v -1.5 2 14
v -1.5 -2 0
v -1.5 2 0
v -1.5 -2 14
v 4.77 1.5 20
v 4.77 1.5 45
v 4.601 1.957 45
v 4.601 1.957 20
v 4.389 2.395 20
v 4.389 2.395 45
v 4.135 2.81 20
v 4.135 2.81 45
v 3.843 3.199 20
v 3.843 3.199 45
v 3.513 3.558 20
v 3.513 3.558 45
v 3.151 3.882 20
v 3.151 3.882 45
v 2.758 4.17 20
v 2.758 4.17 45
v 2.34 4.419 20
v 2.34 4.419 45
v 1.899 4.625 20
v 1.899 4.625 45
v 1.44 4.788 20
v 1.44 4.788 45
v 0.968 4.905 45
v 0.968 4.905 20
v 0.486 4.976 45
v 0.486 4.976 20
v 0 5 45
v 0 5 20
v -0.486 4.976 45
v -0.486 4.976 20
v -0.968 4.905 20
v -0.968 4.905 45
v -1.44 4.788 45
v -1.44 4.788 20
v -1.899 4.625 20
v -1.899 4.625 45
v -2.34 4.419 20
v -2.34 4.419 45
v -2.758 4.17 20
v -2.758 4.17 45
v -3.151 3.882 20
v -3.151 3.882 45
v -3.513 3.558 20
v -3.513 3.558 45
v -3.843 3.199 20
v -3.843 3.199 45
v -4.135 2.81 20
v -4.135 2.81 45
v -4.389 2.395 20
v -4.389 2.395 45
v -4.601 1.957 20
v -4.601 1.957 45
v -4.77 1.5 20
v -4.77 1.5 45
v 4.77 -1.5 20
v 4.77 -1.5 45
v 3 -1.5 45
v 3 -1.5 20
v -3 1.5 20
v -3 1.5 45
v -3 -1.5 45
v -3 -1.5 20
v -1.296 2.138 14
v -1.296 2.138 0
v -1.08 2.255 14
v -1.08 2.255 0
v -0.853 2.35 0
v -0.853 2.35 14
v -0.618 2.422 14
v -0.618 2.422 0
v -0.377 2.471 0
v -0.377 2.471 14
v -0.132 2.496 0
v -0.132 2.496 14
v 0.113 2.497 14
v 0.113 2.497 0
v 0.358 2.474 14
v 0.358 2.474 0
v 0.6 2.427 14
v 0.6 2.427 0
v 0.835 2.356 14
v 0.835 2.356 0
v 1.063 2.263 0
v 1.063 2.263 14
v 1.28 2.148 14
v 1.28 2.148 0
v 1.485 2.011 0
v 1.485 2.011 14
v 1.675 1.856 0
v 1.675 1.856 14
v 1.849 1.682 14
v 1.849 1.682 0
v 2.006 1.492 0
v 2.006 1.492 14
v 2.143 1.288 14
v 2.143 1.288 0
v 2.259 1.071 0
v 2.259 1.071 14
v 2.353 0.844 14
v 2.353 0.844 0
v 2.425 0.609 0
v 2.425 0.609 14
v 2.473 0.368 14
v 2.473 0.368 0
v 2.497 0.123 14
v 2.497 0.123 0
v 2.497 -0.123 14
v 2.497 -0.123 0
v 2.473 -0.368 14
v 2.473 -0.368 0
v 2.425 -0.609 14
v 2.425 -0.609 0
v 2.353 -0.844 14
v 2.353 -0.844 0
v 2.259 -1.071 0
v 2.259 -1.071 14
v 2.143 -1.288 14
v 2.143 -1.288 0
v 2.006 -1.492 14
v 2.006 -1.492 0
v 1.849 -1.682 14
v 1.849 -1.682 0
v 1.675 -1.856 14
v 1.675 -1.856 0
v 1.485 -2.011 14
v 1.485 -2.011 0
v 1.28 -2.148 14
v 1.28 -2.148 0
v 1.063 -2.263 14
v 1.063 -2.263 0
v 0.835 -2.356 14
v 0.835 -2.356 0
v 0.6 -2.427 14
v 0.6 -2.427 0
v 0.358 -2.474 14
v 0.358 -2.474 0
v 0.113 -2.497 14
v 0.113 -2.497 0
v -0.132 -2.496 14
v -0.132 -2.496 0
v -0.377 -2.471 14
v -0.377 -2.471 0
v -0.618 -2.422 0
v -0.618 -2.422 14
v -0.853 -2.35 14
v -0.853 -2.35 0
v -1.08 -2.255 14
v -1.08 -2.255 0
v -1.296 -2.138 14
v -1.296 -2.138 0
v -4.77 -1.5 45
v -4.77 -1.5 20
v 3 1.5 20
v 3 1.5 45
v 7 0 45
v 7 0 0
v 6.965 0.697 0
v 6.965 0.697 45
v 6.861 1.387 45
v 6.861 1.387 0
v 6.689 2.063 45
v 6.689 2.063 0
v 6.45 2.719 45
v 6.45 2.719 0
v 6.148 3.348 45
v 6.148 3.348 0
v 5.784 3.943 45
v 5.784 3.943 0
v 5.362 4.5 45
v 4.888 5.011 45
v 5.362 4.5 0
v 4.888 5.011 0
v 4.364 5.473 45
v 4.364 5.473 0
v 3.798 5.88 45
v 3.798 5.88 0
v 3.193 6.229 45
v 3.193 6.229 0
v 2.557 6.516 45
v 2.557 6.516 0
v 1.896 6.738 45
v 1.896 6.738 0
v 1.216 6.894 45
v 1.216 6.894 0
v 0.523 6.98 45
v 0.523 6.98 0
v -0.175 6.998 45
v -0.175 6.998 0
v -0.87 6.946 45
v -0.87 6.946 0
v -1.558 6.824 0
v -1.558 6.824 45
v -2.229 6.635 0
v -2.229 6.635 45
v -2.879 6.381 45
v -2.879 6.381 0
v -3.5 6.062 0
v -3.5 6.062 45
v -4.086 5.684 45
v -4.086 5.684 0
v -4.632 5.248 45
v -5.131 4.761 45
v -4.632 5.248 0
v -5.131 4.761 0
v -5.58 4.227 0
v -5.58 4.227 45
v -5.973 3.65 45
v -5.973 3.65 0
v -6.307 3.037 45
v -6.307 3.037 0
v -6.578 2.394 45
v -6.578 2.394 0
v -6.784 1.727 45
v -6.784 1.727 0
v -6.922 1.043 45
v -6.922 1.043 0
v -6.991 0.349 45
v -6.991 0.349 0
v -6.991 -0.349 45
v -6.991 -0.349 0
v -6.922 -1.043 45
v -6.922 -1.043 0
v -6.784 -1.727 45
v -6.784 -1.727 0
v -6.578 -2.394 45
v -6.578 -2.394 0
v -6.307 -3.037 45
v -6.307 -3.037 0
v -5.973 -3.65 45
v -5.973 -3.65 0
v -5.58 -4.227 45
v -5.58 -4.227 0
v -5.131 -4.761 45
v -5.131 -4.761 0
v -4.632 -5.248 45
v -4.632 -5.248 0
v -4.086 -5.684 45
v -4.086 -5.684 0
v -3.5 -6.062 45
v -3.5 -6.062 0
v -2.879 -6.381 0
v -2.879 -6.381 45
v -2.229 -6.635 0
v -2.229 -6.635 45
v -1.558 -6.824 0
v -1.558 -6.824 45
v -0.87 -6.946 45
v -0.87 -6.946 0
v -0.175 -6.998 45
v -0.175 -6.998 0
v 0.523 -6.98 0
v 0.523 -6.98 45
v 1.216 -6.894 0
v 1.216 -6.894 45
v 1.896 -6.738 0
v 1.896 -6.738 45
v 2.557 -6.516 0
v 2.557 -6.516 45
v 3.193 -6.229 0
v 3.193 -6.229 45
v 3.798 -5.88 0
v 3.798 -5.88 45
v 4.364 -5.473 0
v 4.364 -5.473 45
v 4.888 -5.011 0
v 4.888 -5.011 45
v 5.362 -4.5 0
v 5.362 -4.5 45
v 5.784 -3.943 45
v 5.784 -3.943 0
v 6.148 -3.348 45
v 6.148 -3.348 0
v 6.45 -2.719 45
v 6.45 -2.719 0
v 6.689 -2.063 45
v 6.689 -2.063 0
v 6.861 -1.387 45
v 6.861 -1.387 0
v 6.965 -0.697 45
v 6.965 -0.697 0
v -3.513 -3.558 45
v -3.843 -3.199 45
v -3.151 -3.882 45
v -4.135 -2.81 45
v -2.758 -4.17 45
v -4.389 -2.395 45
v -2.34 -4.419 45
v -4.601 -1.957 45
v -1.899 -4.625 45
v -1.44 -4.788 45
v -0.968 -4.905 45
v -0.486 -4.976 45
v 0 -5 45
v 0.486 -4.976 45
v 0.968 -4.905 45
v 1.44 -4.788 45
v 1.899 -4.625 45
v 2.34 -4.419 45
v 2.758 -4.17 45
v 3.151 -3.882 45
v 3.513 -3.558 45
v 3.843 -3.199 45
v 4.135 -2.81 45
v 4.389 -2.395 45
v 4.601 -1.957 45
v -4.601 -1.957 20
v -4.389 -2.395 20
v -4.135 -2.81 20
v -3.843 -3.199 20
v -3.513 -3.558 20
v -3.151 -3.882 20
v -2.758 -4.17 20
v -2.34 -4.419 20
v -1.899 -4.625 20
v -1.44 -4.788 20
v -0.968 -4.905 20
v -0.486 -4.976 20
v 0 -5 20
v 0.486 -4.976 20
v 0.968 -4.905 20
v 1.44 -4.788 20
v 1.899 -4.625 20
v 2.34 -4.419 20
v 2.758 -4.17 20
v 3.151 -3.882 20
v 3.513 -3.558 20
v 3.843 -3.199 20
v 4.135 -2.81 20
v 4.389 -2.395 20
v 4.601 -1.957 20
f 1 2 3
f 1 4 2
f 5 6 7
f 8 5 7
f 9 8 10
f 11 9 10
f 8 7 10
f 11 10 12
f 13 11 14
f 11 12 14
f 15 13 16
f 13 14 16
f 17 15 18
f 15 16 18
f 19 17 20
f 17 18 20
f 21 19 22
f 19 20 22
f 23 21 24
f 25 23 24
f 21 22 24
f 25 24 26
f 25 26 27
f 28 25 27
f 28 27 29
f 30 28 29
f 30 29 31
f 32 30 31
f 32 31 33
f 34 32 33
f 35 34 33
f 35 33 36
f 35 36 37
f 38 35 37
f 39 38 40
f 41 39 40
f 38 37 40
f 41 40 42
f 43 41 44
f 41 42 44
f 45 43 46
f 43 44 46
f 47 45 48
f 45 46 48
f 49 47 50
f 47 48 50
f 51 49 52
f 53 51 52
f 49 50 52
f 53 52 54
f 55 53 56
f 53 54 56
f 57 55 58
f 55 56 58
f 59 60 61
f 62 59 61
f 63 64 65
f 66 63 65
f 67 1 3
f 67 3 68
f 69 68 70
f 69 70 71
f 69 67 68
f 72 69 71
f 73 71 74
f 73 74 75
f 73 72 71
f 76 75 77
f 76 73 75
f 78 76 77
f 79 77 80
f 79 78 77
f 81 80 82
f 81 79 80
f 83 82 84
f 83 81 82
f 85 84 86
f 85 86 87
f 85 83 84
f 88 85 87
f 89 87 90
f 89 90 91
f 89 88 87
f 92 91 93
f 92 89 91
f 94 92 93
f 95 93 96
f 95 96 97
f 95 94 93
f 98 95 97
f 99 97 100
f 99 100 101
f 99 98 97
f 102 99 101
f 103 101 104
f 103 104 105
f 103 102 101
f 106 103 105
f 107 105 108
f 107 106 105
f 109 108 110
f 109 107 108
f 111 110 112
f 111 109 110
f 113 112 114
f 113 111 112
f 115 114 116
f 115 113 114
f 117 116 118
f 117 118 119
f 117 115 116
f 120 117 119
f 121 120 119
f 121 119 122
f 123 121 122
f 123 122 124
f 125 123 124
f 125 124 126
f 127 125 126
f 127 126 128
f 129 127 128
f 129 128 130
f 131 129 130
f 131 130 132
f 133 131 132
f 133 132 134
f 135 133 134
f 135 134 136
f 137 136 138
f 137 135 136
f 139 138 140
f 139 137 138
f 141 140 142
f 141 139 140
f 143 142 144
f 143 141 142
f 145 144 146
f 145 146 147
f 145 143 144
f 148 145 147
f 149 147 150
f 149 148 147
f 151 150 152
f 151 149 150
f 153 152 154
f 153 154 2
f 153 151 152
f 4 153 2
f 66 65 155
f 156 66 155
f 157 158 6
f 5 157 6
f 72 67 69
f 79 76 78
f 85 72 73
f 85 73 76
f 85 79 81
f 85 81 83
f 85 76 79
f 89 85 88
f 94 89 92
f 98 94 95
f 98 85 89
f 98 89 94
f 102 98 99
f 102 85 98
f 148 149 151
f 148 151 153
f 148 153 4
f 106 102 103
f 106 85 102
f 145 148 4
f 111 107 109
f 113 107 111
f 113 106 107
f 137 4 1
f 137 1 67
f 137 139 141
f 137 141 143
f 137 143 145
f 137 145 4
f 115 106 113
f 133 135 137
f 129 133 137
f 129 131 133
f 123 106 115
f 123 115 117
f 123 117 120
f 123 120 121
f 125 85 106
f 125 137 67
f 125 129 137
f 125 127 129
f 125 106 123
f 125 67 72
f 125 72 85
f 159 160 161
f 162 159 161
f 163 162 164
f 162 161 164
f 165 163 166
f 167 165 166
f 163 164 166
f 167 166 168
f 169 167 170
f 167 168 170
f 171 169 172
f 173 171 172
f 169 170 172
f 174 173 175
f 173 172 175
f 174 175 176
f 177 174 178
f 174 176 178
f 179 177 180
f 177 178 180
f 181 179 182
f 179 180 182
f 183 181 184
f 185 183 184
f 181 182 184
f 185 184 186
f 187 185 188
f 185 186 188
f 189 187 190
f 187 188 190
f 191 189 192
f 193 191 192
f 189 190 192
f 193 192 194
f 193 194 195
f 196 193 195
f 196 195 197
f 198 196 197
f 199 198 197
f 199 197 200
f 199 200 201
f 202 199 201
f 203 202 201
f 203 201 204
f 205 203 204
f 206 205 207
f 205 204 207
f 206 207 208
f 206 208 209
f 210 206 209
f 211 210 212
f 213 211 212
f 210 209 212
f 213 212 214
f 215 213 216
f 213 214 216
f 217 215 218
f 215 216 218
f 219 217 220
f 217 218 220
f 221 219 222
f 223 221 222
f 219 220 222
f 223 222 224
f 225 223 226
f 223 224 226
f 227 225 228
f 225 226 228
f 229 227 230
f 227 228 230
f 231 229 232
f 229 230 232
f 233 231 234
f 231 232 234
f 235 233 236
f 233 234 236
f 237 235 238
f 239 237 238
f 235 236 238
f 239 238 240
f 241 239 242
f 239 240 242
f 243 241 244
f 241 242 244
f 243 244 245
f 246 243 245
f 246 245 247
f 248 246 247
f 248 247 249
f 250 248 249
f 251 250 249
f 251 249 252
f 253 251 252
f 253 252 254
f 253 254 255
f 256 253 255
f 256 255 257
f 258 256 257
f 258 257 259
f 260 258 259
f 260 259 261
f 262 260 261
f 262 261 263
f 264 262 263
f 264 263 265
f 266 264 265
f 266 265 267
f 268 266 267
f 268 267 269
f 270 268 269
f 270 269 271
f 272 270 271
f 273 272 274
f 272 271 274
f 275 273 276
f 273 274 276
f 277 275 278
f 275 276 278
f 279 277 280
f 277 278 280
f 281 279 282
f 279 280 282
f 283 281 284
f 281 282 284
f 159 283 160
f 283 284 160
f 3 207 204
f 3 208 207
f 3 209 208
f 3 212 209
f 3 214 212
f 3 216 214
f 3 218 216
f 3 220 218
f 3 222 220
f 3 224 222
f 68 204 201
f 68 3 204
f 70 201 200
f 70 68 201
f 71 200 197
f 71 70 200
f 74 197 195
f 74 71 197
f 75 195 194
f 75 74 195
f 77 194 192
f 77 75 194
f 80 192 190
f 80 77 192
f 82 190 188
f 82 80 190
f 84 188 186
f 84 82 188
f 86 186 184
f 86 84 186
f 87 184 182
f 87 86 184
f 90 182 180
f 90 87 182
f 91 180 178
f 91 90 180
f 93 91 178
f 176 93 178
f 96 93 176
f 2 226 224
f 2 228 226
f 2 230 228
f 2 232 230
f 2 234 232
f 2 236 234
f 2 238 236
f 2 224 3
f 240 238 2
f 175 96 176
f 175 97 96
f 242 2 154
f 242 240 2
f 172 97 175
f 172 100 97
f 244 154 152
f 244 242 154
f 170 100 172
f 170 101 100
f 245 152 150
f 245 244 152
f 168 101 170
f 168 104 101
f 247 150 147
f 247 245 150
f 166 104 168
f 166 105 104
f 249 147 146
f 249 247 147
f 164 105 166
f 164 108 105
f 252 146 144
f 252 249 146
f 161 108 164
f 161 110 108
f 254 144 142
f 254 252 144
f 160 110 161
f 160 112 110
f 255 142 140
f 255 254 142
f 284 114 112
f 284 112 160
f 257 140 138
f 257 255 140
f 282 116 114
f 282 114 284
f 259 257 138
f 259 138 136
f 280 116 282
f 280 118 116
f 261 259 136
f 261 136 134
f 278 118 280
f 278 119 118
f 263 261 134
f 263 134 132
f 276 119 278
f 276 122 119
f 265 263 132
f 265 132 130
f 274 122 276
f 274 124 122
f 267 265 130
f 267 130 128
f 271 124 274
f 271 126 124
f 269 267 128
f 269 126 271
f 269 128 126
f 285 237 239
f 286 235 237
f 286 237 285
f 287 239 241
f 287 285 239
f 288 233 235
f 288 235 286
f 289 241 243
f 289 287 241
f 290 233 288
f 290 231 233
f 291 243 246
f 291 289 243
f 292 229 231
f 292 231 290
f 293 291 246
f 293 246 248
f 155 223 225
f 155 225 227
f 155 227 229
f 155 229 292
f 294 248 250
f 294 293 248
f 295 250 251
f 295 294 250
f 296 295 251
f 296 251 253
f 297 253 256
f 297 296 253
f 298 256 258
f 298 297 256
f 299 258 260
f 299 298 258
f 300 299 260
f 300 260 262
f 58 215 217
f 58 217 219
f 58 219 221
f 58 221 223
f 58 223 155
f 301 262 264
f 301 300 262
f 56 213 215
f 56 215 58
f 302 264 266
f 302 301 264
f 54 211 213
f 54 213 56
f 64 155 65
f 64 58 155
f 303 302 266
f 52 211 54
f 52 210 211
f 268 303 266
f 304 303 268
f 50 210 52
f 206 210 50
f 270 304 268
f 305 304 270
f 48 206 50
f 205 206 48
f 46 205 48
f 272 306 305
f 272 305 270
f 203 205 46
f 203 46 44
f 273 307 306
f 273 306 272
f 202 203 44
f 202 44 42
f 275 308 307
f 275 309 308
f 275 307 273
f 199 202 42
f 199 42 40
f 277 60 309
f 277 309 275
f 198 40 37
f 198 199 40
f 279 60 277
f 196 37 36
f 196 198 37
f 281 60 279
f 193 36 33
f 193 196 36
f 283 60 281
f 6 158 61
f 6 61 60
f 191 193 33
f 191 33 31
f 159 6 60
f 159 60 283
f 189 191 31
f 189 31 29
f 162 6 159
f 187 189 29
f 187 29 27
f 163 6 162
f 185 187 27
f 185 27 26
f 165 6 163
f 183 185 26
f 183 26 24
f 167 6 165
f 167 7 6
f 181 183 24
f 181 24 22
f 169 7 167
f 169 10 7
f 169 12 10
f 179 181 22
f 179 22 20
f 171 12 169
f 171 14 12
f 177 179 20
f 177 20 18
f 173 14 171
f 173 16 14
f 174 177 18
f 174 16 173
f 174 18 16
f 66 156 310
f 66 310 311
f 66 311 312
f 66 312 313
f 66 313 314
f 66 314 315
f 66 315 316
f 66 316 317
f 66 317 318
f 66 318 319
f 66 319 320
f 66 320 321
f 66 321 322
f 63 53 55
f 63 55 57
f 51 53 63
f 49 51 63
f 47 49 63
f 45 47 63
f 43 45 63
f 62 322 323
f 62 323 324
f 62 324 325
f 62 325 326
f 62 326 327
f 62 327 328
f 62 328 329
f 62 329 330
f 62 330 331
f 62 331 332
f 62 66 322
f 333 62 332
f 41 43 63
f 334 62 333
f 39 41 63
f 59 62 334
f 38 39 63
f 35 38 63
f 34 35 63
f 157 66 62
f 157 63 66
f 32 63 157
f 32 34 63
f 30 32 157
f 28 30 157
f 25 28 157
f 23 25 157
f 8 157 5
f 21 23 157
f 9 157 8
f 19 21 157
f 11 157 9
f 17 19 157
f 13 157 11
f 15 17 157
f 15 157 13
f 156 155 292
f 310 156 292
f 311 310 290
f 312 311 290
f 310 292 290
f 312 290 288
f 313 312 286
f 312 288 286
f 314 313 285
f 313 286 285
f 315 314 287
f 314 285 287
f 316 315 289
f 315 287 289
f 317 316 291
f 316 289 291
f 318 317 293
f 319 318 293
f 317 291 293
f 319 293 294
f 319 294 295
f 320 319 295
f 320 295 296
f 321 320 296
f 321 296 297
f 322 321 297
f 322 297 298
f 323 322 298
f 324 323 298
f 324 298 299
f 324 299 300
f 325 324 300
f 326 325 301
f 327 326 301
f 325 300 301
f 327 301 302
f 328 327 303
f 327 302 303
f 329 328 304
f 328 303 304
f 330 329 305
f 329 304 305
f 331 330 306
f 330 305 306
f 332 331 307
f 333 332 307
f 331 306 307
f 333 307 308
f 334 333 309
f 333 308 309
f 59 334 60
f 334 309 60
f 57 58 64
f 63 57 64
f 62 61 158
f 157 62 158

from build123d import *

# Parameters (mm, degrees)
F0_R     = 7
F1_DEPTH = 45
F3_DEPTH = 25
F4_R     = 2.55
F5_DEPTH = 10
F7_DEPTH = 4
F8_DEPTH = 10


with BuildPart() as f1:
    # F0 (on Top) → F1 (new body)
    with BuildSketch(Plane.XY):
        Circle(F0_R)
    extrude(amount=F1_DEPTH)

    # F2 (on face) → F3 (cut)
    with BuildSketch(Plane.XY.offset(45)):
        with BuildLine():
            ThreePointArc((4.7696960071, 1.5), (0, 5), (-4.7696960071, 1.5))
            Line((-4.7696960071, 1.5), (-3, 1.5))
            Line((-3, 1.5), (-3, -1.5))
            Line((-3, -1.5), (-4.7696960071, -1.5))
            ThreePointArc((-4.7696960071, -1.5), (0, -5), (4.7696960071, -1.5))
            Line((4.7696960071, -1.5), (3, -1.5))
            Line((3, -1.5), (3, 1.5))
            Line((3, 1.5), (4.7696960071, 1.5))
        make_face()
    extrude(amount=-F3_DEPTH, mode=Mode.SUBTRACT)

    # F4 (on face) → F5 (cut)
    with BuildSketch(Plane(origin=(0, 0, 0), x_dir=(1, 0, 0), z_dir=(0, 0, -1))):
        Circle(F4_R)
    extrude(amount=-F5_DEPTH, mode=Mode.SUBTRACT)

    # F6 (on face) → F7 (cut)
    with BuildSketch(Plane(origin=(0, 0, 10), x_dir=(1, 0, 0), z_dir=(0, 0, -1))):
        with BuildLine():
            Line((-1.5, 2), (-1.5, -2))
            ThreePointArc((-1.5, -2), (2.5, 0), (-1.5, 2))
        make_face()
    extrude(amount=-F7_DEPTH, mode=Mode.SUBTRACT)

    # F8 (add): a face of the model
    f8_faces = [f1.faces().sort_by_distance(p)[0] for p in [
        (-2.4778751083, 0, 10),
    ]]
    extrude(f8_faces, amount=F8_DEPTH)


solid = f1.part
